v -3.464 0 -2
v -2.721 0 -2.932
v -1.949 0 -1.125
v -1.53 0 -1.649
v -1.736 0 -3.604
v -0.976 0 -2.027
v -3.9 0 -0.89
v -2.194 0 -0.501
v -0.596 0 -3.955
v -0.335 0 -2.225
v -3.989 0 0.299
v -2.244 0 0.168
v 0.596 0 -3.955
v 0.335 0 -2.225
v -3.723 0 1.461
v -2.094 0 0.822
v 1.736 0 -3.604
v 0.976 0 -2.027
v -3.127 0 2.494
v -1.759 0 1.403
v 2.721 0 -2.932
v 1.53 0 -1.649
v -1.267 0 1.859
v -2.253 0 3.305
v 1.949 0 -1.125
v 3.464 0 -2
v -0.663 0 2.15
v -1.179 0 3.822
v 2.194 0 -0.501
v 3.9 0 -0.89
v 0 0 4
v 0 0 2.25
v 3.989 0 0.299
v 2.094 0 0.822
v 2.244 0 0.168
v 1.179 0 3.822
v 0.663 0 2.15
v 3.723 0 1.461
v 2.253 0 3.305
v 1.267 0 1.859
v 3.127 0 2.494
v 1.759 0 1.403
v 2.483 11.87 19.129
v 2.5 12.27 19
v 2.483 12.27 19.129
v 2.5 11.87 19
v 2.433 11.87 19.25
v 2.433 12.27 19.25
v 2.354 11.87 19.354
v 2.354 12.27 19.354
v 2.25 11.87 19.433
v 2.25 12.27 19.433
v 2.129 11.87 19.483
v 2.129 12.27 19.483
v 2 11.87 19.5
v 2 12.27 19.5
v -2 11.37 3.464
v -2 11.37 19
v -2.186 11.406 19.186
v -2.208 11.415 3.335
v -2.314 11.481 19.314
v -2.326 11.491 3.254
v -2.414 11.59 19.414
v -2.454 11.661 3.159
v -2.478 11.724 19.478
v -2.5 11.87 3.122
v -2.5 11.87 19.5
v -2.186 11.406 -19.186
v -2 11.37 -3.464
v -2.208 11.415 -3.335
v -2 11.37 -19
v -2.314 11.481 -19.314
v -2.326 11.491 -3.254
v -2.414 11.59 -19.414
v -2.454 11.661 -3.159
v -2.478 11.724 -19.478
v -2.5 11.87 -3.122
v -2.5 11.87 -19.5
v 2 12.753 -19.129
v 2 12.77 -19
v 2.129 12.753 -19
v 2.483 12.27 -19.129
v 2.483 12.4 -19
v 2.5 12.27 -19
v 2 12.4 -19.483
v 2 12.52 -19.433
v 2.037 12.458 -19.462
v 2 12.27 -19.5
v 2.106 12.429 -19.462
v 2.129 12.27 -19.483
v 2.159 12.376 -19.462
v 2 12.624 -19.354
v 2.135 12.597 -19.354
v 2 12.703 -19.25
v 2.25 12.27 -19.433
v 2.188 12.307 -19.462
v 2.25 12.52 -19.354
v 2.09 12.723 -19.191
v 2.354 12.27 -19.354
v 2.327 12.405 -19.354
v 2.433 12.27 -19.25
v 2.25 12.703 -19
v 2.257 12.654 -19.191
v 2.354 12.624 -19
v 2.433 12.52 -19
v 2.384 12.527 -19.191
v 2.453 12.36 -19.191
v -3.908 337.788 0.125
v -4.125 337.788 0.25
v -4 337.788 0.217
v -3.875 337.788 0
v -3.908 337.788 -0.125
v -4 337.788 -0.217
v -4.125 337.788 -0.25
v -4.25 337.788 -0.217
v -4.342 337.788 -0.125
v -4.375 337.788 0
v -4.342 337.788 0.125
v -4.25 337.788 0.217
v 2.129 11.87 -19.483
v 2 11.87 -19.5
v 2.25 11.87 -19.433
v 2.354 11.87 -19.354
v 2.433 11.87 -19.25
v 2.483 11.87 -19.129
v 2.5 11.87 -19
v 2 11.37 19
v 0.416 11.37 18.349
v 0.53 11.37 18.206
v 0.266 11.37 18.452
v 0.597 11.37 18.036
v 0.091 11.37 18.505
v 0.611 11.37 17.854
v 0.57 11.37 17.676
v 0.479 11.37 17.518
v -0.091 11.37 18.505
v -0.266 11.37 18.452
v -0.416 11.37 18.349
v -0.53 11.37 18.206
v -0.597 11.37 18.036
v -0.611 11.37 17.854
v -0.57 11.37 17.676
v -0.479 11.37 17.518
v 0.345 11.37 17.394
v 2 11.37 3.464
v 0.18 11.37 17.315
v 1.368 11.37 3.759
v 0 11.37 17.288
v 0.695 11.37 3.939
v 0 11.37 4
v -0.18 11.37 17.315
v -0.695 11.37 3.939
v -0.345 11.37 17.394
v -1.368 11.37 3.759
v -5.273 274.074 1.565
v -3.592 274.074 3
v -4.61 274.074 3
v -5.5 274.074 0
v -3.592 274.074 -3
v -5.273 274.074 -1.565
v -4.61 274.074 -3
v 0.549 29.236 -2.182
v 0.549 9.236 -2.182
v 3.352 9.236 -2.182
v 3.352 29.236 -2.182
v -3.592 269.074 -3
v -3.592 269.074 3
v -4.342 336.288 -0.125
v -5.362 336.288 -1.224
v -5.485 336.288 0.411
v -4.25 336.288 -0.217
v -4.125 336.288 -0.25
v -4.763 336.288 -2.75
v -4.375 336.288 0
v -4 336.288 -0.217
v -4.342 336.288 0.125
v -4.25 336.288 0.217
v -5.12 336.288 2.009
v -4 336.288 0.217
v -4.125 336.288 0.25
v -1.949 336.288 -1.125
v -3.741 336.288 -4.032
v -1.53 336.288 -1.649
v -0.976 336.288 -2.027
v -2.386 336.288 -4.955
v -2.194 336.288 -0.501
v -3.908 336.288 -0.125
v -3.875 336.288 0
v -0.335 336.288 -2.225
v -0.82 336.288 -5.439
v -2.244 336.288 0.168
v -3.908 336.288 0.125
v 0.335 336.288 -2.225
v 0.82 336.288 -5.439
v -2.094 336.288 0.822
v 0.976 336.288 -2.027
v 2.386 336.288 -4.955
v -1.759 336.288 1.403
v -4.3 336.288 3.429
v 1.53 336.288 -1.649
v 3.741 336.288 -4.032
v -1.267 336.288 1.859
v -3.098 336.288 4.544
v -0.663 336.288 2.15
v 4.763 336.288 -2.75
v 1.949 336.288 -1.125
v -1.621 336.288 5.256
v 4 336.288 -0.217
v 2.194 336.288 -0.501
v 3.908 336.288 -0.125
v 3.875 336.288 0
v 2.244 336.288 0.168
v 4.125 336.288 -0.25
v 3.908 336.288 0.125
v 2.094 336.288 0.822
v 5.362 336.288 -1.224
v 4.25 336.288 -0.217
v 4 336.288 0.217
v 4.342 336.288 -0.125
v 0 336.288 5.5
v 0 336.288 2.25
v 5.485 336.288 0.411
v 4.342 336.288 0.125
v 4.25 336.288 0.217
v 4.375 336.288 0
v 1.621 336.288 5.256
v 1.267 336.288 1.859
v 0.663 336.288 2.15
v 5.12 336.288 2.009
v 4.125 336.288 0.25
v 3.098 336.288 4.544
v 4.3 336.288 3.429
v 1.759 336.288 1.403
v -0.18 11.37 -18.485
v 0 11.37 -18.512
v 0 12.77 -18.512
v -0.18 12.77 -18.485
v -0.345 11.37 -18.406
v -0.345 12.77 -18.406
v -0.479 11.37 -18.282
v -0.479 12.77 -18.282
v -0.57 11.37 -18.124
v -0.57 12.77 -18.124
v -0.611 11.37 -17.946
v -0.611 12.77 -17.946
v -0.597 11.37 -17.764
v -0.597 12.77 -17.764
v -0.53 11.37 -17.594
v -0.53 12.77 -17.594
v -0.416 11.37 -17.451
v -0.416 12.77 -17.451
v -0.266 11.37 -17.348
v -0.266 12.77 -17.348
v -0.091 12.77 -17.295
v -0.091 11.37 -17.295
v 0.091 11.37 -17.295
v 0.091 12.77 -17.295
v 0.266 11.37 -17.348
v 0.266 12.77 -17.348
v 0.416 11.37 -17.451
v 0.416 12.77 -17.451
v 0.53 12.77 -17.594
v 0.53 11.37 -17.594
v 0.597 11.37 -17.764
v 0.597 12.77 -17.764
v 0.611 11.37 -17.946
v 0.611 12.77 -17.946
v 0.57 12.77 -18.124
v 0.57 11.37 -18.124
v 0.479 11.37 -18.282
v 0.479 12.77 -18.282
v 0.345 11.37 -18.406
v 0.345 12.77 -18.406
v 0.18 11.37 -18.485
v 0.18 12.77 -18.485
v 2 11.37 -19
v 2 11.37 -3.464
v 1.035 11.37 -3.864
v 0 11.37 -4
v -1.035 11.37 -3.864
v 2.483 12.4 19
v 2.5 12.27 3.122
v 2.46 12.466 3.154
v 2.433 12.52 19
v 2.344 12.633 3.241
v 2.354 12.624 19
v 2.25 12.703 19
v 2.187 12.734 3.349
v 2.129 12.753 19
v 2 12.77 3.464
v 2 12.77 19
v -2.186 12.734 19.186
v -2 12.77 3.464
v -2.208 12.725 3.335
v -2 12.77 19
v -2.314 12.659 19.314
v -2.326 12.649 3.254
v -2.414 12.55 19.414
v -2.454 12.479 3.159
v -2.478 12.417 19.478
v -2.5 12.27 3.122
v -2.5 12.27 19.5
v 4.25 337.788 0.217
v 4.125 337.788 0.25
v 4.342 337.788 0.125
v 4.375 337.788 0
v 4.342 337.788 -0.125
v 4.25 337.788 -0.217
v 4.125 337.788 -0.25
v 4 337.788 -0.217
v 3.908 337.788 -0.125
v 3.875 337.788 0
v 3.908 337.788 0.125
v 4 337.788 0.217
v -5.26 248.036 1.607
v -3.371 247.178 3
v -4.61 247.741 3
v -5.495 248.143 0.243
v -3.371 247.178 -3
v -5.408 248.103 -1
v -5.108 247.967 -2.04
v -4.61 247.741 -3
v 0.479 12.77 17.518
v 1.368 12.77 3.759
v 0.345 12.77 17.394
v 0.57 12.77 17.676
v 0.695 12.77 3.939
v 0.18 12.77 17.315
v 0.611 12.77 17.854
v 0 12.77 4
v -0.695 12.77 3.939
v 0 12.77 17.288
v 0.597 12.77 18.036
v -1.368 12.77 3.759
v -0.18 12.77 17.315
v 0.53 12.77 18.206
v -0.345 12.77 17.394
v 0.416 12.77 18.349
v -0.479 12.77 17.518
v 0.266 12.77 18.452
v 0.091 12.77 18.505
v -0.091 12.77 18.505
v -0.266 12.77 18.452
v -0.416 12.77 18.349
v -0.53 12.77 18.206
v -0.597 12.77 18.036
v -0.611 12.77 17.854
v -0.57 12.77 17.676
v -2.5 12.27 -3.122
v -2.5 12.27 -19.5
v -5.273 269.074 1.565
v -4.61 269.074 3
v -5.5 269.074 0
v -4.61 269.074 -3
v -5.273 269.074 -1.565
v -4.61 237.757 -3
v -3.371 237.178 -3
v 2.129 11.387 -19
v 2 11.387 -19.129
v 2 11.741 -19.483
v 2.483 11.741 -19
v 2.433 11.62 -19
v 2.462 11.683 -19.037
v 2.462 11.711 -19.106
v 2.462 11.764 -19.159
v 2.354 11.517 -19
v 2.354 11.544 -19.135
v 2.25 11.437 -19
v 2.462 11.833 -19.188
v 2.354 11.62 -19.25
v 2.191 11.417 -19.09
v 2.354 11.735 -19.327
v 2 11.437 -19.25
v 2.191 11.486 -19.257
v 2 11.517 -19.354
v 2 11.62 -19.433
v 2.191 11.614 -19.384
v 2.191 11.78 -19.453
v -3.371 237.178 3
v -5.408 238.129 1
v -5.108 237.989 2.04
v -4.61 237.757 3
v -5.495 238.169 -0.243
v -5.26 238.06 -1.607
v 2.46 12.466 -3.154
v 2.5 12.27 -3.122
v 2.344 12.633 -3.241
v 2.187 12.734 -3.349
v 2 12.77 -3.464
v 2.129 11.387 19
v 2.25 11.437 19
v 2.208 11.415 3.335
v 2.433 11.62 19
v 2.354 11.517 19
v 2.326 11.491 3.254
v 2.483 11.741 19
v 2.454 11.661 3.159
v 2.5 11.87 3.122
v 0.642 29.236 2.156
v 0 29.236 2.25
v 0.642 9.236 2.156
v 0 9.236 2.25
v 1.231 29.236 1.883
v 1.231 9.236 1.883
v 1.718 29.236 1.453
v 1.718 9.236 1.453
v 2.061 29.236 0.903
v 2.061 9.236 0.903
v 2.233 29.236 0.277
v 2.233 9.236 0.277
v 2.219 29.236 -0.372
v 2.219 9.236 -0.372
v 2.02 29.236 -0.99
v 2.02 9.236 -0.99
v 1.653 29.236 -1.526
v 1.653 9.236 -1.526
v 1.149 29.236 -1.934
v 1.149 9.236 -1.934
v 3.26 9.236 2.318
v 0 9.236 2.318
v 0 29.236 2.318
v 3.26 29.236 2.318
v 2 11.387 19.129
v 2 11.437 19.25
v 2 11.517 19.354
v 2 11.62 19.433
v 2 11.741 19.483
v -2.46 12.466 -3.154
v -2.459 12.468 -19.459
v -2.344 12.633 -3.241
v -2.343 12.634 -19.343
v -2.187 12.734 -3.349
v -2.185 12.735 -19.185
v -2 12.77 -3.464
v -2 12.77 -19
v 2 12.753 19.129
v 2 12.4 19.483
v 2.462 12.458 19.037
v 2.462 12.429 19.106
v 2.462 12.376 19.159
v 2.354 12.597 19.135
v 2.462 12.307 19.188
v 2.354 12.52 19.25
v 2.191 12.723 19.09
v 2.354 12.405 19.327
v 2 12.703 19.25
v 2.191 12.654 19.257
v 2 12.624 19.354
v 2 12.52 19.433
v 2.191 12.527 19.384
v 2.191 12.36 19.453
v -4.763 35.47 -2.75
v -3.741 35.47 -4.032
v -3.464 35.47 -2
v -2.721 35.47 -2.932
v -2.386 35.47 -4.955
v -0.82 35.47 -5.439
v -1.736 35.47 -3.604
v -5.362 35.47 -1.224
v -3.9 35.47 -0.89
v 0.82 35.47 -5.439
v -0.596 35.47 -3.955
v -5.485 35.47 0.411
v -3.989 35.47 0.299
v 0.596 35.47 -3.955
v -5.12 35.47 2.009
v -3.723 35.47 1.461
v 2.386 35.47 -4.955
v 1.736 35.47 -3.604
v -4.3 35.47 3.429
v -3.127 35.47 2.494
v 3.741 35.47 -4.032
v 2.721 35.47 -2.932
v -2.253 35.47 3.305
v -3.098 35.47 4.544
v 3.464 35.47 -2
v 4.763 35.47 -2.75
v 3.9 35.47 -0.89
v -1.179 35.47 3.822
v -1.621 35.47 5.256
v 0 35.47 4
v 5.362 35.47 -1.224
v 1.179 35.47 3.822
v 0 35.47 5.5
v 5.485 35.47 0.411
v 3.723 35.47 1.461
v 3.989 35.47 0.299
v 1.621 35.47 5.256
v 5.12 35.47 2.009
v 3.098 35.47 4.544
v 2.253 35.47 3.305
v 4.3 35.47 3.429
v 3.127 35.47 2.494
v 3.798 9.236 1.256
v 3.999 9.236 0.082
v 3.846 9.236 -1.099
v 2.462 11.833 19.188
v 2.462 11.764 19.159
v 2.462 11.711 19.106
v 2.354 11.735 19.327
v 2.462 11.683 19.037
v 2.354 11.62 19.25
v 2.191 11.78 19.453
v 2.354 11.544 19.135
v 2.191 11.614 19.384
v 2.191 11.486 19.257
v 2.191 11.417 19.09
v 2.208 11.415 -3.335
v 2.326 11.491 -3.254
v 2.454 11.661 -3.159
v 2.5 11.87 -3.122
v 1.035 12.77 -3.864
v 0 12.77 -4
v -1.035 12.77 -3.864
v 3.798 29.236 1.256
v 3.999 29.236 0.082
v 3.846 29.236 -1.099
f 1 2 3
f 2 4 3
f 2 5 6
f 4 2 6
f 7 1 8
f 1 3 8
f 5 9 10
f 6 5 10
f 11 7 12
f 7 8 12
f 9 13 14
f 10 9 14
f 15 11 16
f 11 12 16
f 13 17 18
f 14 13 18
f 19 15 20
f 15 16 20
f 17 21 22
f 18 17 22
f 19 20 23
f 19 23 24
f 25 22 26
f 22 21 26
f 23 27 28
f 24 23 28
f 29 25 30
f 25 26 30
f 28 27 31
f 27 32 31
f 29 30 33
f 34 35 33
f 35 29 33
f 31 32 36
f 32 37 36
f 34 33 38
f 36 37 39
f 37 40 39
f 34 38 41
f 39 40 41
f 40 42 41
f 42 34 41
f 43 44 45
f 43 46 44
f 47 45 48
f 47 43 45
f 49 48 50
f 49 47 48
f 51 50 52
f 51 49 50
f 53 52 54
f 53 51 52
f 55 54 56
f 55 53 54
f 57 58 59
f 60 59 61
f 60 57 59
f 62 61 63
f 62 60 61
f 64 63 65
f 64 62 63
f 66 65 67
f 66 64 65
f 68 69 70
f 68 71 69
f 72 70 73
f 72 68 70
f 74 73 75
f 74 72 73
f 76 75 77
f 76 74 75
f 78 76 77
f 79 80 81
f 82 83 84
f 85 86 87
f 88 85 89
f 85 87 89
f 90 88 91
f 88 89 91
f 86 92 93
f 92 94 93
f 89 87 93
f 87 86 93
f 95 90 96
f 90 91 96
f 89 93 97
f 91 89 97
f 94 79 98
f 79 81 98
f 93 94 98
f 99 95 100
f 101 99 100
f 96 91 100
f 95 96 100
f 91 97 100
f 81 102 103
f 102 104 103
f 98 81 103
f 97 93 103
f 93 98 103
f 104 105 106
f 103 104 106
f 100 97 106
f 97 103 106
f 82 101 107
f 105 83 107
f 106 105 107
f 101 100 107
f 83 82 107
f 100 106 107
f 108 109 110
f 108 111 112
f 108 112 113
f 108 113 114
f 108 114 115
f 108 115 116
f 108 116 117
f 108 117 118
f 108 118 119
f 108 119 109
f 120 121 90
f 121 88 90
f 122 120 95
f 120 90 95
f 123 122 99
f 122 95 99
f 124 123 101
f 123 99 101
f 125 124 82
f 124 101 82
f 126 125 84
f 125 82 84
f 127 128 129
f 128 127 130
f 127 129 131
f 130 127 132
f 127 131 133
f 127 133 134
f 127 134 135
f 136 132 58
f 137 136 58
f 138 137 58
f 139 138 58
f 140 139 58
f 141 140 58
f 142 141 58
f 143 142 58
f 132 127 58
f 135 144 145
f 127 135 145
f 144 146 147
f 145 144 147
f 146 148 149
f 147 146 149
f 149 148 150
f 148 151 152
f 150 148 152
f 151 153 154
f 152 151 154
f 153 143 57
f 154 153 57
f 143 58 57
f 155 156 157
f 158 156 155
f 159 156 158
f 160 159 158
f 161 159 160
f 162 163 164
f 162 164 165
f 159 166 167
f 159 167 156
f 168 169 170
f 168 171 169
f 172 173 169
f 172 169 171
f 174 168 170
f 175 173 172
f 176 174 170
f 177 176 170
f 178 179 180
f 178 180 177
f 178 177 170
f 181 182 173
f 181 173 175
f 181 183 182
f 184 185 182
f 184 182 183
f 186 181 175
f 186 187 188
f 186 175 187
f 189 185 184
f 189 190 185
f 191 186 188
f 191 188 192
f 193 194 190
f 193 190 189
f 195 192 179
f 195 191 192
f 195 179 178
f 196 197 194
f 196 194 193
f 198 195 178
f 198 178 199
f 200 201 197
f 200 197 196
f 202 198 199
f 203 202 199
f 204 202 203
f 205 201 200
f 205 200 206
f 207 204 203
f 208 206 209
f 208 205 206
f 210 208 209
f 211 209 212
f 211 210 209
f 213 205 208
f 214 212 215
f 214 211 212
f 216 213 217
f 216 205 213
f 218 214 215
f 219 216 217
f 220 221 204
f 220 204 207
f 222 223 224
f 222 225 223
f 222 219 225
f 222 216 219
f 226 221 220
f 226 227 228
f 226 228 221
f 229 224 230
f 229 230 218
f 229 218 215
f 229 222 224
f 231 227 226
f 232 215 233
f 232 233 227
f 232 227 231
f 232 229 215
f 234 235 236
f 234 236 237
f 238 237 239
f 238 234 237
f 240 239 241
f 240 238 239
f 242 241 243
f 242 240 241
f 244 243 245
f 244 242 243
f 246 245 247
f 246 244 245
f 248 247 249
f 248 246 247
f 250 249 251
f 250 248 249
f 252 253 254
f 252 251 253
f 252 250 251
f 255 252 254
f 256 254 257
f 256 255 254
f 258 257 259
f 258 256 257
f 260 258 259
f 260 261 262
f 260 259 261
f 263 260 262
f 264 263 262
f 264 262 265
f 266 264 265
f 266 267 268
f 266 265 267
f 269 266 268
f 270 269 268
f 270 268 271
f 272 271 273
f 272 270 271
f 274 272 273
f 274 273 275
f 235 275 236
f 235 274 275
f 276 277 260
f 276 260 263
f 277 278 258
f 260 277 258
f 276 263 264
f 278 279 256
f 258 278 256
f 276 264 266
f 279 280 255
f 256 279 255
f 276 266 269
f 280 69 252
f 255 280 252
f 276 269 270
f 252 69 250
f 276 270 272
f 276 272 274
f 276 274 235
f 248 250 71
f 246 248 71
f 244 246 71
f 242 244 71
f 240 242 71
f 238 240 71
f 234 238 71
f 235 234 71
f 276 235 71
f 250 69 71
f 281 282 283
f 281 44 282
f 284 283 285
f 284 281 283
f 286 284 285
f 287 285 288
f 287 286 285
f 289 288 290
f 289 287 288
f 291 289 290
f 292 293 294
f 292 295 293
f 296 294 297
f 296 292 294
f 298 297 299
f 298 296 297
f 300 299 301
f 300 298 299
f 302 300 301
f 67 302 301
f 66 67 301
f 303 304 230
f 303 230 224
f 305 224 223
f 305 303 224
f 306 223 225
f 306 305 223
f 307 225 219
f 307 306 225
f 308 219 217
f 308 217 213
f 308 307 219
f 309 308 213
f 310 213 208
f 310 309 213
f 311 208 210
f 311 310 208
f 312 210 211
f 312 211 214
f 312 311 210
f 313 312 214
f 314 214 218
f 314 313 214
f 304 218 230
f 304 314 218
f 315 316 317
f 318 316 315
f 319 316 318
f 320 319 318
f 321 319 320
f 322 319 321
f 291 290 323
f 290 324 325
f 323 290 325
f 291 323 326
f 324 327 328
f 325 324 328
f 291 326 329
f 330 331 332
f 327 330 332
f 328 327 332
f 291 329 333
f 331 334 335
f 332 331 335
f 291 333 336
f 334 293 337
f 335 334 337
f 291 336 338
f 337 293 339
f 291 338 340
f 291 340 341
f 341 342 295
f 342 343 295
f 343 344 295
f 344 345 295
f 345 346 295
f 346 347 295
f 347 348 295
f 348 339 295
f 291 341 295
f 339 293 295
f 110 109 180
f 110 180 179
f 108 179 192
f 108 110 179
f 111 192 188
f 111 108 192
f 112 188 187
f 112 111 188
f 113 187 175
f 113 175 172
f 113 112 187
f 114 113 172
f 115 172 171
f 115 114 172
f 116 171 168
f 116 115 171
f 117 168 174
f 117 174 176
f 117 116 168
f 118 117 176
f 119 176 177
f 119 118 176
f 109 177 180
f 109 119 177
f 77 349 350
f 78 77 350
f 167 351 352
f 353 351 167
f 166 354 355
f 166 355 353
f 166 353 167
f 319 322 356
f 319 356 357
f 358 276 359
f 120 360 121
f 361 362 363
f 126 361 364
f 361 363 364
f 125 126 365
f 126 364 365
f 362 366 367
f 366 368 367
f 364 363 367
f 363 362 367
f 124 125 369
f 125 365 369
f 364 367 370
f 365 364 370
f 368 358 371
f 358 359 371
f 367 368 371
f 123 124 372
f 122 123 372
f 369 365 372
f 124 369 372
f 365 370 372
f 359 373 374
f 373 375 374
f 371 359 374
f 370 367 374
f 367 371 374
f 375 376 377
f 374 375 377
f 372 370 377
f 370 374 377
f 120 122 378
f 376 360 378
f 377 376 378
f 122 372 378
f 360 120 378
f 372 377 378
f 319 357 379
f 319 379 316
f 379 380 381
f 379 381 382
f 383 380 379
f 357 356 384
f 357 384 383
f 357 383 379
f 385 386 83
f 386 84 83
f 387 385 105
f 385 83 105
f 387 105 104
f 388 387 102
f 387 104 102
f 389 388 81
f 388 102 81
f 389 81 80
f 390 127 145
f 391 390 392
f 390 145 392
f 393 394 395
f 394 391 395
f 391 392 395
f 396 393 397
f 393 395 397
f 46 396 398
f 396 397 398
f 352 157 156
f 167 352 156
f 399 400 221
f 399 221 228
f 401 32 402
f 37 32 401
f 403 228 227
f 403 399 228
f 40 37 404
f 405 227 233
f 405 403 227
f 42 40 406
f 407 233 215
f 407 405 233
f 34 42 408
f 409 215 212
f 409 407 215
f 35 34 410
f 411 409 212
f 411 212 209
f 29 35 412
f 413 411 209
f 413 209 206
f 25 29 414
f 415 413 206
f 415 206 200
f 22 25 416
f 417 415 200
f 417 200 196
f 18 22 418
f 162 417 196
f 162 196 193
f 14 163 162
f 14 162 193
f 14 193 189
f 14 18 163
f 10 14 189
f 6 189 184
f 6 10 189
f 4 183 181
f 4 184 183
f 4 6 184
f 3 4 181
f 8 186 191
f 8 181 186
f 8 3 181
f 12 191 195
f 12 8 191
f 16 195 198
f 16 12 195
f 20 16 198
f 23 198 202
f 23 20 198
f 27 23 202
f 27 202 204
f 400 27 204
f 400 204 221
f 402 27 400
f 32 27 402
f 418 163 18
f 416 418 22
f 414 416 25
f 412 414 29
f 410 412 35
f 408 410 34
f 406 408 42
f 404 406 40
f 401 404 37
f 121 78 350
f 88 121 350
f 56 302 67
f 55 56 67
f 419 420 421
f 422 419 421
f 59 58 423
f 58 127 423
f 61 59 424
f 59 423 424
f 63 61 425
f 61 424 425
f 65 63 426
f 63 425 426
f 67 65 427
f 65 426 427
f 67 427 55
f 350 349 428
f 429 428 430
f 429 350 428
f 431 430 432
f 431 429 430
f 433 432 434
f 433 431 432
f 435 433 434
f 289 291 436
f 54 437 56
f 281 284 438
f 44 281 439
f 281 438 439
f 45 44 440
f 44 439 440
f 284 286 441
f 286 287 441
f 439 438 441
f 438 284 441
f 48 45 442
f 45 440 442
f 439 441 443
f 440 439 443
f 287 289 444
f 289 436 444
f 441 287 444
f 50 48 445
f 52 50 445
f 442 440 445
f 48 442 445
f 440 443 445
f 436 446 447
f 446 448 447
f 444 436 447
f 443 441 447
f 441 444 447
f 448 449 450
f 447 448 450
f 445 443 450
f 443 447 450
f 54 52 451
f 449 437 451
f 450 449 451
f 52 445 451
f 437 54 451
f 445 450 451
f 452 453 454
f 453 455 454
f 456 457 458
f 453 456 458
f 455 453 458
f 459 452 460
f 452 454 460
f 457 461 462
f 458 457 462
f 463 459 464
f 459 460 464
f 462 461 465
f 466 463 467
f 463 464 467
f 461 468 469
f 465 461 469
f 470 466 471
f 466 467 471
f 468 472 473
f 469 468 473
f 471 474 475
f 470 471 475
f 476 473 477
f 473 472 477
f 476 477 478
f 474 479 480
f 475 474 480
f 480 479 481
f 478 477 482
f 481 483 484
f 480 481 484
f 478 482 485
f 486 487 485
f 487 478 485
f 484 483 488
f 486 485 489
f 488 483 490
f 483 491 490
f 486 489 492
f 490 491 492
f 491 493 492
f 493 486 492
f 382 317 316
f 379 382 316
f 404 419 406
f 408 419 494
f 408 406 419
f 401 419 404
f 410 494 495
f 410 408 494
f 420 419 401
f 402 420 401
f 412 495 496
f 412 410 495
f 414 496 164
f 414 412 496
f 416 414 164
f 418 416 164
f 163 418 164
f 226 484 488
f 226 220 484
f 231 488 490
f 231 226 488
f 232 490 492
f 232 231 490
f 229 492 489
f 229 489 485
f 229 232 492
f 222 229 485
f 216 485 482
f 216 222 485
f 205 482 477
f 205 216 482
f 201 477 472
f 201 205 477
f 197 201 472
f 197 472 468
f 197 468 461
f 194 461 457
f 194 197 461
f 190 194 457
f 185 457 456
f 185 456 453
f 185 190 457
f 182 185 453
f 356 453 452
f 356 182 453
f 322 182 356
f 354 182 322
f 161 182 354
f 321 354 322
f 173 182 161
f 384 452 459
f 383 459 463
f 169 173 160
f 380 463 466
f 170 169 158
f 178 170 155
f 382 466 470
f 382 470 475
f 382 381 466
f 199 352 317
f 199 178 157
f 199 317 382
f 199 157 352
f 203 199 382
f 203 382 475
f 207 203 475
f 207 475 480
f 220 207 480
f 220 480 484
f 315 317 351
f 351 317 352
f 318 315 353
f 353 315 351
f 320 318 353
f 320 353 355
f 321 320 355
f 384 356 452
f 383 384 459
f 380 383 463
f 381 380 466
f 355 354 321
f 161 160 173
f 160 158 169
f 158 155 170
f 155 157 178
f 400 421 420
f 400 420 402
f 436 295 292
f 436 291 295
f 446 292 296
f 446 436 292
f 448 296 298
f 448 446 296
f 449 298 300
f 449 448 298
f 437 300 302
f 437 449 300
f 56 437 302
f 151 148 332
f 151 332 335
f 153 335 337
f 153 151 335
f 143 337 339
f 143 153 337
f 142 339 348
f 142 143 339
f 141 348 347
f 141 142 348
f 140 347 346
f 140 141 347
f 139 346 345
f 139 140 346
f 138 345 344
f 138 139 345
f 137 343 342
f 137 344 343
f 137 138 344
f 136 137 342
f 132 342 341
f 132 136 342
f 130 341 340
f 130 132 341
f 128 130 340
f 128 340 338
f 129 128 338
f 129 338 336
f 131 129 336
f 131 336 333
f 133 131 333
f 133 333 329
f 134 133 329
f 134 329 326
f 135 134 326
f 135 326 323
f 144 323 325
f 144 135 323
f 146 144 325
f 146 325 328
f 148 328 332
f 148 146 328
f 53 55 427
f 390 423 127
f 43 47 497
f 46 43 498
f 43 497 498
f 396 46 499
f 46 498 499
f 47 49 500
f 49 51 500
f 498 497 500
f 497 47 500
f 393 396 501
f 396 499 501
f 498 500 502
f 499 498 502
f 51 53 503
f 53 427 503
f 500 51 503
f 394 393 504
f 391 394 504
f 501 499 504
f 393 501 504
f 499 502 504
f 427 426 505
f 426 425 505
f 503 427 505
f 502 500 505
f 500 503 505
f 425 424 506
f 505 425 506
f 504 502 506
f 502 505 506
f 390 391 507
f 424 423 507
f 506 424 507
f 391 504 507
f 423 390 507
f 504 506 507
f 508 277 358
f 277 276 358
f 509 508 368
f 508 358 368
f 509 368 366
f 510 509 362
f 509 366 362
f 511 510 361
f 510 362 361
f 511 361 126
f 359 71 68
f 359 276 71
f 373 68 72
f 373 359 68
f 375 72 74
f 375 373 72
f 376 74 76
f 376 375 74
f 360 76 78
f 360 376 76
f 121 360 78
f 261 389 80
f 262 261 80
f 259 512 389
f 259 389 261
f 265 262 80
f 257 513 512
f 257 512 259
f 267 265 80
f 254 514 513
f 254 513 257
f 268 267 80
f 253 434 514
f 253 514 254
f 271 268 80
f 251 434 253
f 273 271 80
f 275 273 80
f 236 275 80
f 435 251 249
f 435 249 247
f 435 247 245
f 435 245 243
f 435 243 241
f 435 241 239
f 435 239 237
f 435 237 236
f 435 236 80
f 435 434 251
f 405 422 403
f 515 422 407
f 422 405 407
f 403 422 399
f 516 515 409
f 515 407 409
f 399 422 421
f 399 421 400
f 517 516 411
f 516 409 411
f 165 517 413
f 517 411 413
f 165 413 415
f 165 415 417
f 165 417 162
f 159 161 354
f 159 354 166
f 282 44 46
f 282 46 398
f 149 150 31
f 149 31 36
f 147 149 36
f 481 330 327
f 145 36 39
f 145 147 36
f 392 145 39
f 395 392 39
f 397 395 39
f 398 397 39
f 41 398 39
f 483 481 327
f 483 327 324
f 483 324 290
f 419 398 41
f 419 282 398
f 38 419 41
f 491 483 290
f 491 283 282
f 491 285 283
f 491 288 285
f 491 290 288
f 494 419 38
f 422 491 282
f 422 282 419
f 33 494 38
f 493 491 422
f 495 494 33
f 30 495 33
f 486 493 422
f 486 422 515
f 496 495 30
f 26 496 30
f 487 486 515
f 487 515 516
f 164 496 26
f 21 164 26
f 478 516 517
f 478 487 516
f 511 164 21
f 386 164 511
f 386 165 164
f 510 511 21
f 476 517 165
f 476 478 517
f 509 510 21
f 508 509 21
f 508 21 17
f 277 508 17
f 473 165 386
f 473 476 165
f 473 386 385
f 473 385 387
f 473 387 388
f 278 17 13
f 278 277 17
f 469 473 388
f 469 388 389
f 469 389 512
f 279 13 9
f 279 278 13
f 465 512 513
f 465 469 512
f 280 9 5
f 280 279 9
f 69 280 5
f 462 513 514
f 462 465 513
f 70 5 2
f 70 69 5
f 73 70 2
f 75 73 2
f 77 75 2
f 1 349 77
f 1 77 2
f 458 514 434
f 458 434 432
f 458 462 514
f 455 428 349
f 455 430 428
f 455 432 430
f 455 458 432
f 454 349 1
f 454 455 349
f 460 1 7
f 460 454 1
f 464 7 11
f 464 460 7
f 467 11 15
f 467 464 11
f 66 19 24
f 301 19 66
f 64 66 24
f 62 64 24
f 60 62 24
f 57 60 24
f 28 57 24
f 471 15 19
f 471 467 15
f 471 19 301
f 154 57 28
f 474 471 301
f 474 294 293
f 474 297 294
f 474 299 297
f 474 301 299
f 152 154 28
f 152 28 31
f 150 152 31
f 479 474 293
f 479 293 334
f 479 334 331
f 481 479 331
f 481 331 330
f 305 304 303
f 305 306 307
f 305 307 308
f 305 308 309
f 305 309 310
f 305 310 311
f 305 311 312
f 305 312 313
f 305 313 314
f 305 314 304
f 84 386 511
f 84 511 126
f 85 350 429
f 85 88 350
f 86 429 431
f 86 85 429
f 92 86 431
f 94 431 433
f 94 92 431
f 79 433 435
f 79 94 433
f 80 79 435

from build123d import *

# Parameters (mm, degrees)
SWEEP3_PROFILE_R         = 4
SWEEP4_PROFILE_R         = 5.5
SKETCH45_R               = 2.25
CUT_EXTRUDE2_DEPTH       = 337.377466094
SWEEP5_PROFILE_R         = 0.25
SWEEP6_PROFILE_R         = 0.25
SKETCH72_W               = 4.5
SKETCH72_H               = 20
CUT_EXTRUDE6_DEPTH       = 20
BOSS_EXTRUDE1_DEPTH      = 2.5
BOSS_EXTRUDE1_DEPTH_BACK = 2.5
BOSS_EXTRUDE3_DEPTH      = 2.5
BOSS_EXTRUDE3_DEPTH_BACK = 2.5
SKETCH76_4_W             = 16.5
SKETCH76_4_H             = 1.4
SKETCH77_R               = 0.612238256
CUT_EXTRUDE7_DEPTH       = 20
FILLET1_R                = 0.5
CUT_EXTRUDE9_DEPTH       = 3
CUT_EXTRUDE9_DEPTH_BACK  = 3


with BuildPart() as part:
    # Sweep3: sweep along a path in Sketch31
    with BuildLine(Plane.XY) as sweep3_path:
        Line((0, 0), (0, 35.470165431))
    # Sweep3 profile (on start of the path) → Sweep3 (sweep)
    with BuildSketch(Plane.ZX):
        Circle(SWEEP3_PROFILE_R)
    sweep(path=sweep3_path.line)

    # Sweep4: sweep along a path in Sketch38
    with BuildLine(Plane.XY) as sweep4_path:
        Line((0, 35.470165431), (0, 336.287525335))
    # Sweep4 profile (on start of the path) → Sweep4 (sweep)
    with BuildSketch(Plane.ZX.offset(35.470165431)):
        Circle(SWEEP4_PROFILE_R)
    sweep(path=sweep4_path.line)

    # Sketch45 → Cut-Extrude2 (cut, through all)
    with BuildSketch(Plane(origin=(0, 0, 0), x_dir=(1, 0, 0), z_dir=(0, 1, 0))):
        Circle(SKETCH45_R)
    extrude(amount=CUT_EXTRUDE2_DEPTH, mode=Mode.SUBTRACT)

    # Sweep5: sweep along a curve in space
    with BuildLine() as sweep5_path:
        Line((4.125, 336.287525335, 5.531e-06), (4.125, 337.787525335, 5.531e-06))
    # Sweep5 profile (on start of the path) → Sweep5 (sweep)
    with BuildSketch(Plane(origin=(4.125, 336.287525335, 5.531e-06), x_dir=(0, 0, 1), z_dir=(0, 1, 0))):
        Circle(SWEEP5_PROFILE_R)
    sweep(path=sweep5_path.line)

    # Sweep6: sweep along a curve in space
    with BuildLine() as sweep6_path:
        Line((-4.125, 336.287525335, 9.31e-07), (-4.125, 337.787525335, 9.31e-07))
    # Sweep6 profile (on start of the path) → Sweep6 (sweep)
    with BuildSketch(Plane(origin=(-4.125, 336.287525335, 9.31e-07), x_dir=(0, 0, 1), z_dir=(0, 1, 0))):
        Circle(SWEEP6_PROFILE_R)
    sweep(path=sweep6_path.line)

    # Sketch72 → Cut-Extrude6 (cut)
    with BuildSketch(Plane(origin=(0, 0, 0), x_dir=(0, 0, -1), z_dir=(1, 0, 0))):
        with Locations((-0.068000409, 19.236124066)):
            Rectangle(SKETCH72_W, SKETCH72_H)
    extrude(amount=CUT_EXTRUDE6_DEPTH, mode=Mode.SUBTRACT)

    # Sketch76 → Boss-Extrude1 (add, two sides: drawn at the far end of the back side and taken through both)
    with BuildSketch(Plane(origin=(0, 0, 0), x_dir=(0, 0, -1), z_dir=(1, 0, 0)).offset(-BOSS_EXTRUDE1_DEPTH_BACK)):
        Polygon((-3, 12.070165431), (-3, 12.770165431), (-19.5, 12.770165431), (-19.5, 12.370165431), (-19.5, 11.370165431), (-3, 11.370165431), align=None)
    extrude(amount=BOSS_EXTRUDE1_DEPTH + BOSS_EXTRUDE1_DEPTH_BACK)

    # Sketch76<4> → Boss-Extrude3 (add, two sides: drawn at the far end of the back side and taken through both)
    with BuildSketch(Plane(origin=(0, 0, 0), x_dir=(0, 0, -1), z_dir=(1, 0, 0)).offset(-BOSS_EXTRUDE3_DEPTH_BACK)):
        with Locations((11.25, 12.070165431)):
            Rectangle(SKETCH76_4_W, SKETCH76_4_H)
    extrude(amount=BOSS_EXTRUDE3_DEPTH + BOSS_EXTRUDE3_DEPTH_BACK)

    # Sketch77 → Cut-Extrude7 (cut)
    with BuildSketch(Plane(origin=(0, 0, 0), x_dir=(1, 0, 0), z_dir=(0, 1, 0))):
        with Locations((0, 17.9)):
            Circle(SKETCH77_R)
        with Locations((0, -17.9)):
            Circle(SKETCH77_R)
    extrude(amount=CUT_EXTRUDE7_DEPTH, mode=Mode.SUBTRACT)

    # Fillet1
    fillet1_edges = [part.edges().sort_by_distance(p)[0] for p in [
        (-2.5, 12.770165431, 11.3112495),
        (-2.5, 11.370165431, 11.3112495),
        (2.5, 12.070165431, 19.5),
        (0, 11.370165431, 19.5),
        (2.5, 11.370165431, 11.3112495),
        (2.5, 12.770165431, 11.3112495),
        (0, 12.770165431, 19.5),
        (-2.5, 11.370165431, -11.3112495),
        (-2.5, 12.770165431, -11.3112495),
        (0, 12.770165431, -19.5),
        (0, 11.370165431, -19.5),
        (2.5, 12.070165431, -19.5),
        (2.5, 11.370165431, -11.3112495),
        (2.5, 12.770165431, -11.3112495),
    ]]
    fillet(fillet1_edges, radius=FILLET1_R)

    # Sketch81 → Cut-Extrude9 (cut, two sides: drawn at the far end of the back side and taken through both)
    with BuildSketch(Plane.XY.offset(-CUT_EXTRUDE9_DEPTH_BACK)):
        Polygon((-3.370825875, 247.178368204), (-51.601612029, 269.074039778), (-3.592025731, 269.074039778), (-3.592025731, 274.074039778), (-49.327088533, 274.074039778), (-55.247485048, 261.387475818), (-3.370825875, 237.178368204), align=None)
    extrude(amount=CUT_EXTRUDE9_DEPTH + CUT_EXTRUDE9_DEPTH_BACK, mode=Mode.SUBTRACT)


solid = part.part
